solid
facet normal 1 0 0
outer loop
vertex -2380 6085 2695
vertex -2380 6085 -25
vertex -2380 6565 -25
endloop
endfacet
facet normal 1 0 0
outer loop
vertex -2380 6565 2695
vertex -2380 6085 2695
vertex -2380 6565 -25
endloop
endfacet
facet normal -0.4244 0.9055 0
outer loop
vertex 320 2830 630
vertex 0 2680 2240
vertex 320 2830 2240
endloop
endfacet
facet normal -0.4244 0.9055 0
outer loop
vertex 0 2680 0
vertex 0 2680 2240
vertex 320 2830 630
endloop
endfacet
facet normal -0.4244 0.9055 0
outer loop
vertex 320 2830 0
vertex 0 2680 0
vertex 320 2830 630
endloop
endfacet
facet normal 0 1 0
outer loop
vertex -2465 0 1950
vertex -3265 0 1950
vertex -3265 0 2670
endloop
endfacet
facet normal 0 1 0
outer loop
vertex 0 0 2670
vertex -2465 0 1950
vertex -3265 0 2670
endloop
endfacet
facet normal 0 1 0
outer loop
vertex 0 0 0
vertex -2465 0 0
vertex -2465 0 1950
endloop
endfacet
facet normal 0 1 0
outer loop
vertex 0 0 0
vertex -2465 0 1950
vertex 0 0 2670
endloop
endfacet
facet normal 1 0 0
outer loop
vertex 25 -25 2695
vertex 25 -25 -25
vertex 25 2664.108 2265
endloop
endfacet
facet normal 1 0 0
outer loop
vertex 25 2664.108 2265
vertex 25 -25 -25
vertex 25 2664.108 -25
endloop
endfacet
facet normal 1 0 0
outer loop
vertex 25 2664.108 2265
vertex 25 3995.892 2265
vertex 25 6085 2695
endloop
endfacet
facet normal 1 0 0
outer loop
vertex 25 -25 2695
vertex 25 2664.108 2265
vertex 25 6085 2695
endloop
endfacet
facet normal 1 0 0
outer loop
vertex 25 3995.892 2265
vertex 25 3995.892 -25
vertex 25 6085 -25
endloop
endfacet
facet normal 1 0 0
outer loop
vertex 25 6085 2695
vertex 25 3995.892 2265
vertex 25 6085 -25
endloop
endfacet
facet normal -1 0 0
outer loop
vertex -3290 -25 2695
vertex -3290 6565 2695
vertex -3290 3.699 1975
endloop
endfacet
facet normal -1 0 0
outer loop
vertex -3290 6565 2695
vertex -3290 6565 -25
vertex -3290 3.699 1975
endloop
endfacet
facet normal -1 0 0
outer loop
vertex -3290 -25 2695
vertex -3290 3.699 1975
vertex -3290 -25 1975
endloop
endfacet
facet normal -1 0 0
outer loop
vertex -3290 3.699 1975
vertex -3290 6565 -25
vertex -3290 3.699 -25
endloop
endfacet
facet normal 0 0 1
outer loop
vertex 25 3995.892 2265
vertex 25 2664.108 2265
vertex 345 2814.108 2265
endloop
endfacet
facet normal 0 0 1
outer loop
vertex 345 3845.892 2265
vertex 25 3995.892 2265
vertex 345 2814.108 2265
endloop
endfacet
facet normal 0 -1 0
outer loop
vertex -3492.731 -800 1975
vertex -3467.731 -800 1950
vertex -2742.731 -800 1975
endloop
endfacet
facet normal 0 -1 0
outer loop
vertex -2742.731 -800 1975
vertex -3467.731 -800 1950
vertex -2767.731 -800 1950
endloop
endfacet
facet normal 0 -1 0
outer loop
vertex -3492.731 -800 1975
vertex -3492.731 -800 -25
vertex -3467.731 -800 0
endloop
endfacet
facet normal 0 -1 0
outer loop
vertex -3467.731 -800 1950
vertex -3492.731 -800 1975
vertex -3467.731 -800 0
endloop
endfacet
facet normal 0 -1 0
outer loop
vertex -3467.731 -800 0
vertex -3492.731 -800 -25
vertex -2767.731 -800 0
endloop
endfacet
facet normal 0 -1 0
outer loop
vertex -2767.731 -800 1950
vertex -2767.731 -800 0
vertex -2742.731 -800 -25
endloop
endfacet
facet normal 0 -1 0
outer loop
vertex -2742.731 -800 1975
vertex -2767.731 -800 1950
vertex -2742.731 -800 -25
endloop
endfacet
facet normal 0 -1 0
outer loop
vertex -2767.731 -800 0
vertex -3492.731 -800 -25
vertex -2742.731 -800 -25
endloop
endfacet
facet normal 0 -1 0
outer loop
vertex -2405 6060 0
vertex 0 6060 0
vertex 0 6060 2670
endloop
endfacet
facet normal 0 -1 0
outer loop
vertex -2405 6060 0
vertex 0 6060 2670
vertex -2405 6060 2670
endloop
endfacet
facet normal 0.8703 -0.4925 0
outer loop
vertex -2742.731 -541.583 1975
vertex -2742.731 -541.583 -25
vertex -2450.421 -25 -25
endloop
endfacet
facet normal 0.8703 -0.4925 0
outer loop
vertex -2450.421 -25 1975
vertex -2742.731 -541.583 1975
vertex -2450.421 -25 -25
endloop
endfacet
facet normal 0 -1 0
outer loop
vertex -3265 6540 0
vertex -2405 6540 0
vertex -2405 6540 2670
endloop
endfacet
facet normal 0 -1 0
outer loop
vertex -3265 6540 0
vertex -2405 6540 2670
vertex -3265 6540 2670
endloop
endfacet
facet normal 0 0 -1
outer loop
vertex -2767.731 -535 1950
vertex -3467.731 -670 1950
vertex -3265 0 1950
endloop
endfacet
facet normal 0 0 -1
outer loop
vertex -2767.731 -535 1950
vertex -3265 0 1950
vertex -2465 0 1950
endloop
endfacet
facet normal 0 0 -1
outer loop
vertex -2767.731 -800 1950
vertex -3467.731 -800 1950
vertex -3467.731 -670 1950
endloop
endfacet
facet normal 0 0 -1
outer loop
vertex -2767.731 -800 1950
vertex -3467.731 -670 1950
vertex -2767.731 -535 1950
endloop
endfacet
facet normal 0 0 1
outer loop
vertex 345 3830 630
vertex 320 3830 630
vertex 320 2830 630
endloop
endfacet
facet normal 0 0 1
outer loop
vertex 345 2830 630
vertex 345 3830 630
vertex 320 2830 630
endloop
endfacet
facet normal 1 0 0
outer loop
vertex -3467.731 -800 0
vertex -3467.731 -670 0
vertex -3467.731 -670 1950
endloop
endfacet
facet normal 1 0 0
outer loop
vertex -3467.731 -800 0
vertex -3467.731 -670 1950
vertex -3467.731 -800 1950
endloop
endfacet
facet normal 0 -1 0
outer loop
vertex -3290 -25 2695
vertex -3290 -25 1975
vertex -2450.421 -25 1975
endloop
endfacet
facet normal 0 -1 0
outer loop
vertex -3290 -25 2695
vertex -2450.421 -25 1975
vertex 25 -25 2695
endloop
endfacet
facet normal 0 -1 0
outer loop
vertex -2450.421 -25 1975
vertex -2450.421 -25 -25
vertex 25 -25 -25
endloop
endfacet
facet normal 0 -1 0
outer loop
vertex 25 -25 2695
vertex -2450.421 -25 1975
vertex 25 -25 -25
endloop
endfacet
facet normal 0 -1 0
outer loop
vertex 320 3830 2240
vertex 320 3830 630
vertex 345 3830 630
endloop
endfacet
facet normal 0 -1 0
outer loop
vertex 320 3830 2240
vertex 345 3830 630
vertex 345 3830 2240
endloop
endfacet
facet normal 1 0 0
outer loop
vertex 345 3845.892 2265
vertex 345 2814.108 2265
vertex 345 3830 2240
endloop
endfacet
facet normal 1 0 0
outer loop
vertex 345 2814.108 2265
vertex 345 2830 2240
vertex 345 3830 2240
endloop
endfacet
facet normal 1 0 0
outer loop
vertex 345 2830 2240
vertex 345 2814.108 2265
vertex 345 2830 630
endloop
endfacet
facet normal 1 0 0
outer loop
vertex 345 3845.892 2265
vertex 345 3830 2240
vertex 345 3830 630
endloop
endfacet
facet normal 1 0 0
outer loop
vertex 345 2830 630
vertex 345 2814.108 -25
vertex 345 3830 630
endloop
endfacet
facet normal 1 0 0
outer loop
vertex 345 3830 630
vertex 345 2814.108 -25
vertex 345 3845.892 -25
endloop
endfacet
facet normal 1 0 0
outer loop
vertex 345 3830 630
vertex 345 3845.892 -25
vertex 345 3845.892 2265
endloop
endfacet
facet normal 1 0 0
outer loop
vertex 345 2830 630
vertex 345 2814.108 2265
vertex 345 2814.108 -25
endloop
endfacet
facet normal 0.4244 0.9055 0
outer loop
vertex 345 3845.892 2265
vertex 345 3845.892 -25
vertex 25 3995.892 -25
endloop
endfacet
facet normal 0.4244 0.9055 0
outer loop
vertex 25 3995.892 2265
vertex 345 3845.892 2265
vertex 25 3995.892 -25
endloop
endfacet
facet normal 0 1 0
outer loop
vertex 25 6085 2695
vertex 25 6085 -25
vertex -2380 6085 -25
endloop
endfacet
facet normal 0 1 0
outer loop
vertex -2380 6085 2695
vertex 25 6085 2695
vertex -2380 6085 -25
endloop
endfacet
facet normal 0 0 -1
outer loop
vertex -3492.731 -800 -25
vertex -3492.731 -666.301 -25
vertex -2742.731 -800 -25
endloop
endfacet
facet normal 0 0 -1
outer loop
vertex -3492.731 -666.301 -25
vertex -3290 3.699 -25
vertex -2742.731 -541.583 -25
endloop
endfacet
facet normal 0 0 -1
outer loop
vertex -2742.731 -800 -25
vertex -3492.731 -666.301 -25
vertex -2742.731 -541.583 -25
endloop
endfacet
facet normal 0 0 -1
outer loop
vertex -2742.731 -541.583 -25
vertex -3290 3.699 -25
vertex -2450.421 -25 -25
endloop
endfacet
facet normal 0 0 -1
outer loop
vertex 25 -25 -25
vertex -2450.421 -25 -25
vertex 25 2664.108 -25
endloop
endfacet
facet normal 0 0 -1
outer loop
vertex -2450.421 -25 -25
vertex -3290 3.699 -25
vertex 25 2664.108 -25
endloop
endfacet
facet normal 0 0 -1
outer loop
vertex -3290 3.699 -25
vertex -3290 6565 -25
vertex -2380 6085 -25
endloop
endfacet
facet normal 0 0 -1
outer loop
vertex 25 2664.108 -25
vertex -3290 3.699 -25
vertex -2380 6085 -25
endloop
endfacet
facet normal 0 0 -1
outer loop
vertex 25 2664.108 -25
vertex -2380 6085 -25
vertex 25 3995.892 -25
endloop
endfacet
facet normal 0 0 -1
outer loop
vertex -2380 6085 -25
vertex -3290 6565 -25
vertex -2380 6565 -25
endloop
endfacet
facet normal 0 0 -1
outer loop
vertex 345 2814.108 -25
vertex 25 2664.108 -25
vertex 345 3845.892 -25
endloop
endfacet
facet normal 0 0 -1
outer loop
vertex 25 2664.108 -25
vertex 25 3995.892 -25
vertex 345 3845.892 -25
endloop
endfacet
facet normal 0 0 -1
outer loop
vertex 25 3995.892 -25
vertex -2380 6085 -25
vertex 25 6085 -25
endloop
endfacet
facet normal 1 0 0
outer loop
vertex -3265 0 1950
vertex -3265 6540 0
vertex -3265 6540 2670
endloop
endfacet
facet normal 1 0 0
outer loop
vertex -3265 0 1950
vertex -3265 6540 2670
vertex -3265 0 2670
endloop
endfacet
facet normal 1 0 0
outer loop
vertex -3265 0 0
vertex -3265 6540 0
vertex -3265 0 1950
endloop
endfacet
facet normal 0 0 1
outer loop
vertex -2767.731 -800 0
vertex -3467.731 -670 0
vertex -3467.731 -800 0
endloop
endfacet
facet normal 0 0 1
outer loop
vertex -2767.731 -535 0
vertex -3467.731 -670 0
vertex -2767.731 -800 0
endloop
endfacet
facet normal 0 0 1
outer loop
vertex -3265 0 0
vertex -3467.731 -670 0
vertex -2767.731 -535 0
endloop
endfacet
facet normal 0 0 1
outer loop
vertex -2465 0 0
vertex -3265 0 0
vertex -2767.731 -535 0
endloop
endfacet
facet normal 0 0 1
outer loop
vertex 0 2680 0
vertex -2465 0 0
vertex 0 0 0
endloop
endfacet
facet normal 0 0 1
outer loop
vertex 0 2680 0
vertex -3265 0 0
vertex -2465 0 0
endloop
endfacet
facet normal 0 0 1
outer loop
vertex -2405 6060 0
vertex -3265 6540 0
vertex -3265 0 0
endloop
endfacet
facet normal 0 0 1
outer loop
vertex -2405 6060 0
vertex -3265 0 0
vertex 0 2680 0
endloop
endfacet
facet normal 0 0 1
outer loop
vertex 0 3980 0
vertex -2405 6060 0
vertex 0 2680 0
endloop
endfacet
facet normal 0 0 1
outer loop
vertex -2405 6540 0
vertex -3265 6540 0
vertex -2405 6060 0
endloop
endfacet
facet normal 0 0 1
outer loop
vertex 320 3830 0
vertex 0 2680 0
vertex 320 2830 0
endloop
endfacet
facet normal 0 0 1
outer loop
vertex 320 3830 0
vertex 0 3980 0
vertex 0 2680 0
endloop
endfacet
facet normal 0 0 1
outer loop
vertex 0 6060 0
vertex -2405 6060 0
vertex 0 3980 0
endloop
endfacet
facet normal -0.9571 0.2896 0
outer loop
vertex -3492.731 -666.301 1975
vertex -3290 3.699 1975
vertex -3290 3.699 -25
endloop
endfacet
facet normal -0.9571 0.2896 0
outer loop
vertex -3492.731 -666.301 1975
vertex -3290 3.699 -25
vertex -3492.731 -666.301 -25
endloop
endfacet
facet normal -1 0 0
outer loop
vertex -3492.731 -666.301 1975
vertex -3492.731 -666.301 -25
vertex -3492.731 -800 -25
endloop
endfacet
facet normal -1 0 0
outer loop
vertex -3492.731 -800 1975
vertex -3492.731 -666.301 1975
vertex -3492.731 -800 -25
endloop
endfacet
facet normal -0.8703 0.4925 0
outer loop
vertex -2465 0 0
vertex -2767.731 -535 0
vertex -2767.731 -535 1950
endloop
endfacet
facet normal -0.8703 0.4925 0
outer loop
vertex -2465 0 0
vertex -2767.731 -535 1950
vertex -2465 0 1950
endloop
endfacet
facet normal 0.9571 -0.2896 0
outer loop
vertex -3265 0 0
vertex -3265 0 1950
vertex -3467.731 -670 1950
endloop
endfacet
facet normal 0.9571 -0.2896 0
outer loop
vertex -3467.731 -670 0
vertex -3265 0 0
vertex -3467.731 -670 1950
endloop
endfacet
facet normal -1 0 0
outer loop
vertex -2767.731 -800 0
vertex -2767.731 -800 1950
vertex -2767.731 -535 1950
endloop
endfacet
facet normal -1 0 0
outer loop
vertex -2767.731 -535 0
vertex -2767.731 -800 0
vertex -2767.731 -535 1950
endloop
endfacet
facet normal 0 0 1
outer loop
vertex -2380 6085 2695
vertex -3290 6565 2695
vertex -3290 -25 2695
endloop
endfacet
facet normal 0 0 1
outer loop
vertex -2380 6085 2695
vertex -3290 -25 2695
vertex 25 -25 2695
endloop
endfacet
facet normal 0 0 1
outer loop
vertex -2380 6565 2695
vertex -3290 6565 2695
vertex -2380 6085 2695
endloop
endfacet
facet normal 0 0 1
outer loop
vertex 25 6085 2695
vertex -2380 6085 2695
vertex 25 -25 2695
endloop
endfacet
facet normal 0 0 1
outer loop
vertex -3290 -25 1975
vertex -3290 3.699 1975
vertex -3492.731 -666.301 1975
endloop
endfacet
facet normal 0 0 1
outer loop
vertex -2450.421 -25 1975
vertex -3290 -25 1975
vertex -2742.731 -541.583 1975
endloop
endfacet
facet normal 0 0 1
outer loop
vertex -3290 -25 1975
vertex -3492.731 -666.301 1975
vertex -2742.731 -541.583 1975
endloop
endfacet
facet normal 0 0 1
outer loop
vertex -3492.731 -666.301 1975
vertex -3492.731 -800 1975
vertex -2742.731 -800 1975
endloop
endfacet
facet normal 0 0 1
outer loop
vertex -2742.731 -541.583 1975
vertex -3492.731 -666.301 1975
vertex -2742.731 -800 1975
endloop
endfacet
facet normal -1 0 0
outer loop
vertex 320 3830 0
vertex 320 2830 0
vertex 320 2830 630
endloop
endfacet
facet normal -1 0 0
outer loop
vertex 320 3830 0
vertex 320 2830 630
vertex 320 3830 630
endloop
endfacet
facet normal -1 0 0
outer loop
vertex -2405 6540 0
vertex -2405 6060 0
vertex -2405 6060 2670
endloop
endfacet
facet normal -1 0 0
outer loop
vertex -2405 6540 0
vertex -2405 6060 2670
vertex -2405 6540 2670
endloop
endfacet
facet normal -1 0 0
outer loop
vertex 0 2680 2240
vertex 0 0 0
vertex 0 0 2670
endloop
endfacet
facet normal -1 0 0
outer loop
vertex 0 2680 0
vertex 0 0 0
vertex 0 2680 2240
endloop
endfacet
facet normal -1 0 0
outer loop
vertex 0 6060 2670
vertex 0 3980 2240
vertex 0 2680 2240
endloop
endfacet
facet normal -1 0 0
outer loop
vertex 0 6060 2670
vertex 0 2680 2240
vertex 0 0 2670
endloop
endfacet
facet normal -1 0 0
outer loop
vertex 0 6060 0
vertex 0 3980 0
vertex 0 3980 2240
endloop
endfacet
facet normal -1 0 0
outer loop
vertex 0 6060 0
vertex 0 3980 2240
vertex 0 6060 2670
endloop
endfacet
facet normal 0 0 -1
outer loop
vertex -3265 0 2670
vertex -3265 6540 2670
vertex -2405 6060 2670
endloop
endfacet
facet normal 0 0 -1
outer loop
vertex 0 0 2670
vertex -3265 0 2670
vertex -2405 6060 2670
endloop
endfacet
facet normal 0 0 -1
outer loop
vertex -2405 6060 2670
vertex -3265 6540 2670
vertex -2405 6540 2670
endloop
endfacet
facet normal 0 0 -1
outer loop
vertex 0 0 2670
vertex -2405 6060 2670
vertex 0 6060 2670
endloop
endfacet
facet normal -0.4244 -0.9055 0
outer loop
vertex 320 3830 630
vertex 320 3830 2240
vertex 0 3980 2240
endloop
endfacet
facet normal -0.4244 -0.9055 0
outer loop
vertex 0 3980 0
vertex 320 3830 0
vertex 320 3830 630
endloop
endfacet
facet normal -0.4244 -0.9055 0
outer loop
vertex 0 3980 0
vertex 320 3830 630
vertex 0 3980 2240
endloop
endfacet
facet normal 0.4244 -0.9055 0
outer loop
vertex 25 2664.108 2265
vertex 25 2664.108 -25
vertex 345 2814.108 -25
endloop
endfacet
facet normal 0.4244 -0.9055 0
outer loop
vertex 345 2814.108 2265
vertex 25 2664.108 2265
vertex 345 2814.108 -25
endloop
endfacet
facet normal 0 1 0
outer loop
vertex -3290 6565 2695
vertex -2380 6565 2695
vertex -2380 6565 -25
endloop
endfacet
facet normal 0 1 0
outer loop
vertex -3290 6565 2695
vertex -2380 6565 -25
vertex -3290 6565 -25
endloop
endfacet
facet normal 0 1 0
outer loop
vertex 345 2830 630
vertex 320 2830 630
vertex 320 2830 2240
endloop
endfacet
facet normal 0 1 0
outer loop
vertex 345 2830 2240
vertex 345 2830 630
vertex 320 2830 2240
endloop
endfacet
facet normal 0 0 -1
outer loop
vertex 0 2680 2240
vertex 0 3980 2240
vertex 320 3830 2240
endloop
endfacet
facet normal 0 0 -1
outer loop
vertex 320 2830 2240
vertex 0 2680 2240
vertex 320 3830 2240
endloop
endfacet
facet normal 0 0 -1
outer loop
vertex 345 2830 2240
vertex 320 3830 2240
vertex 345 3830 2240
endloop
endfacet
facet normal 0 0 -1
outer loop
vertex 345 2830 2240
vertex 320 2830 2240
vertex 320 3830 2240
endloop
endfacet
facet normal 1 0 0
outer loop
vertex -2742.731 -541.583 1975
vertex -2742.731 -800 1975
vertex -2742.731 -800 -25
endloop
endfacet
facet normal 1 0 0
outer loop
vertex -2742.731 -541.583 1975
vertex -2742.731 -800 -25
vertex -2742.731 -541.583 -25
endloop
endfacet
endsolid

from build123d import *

# Parameters (mm, degrees)
F1_DEPTH  = 2670
F4_DEPTH  = 720
F7_DEPTH  = 430
F8_T      = 25
F9_W      = 1000
F9_H      = 1610
F10_DEPTH = 25


with BuildPart() as f1:
    # F0 (on Top) → F1 (new body)
    with BuildSketch(Plane.XY):
        Polygon((-2465, 0), (0, 0), (0, 2680), (320, 2830), (320, 3830), (0, 3980), (0, 6060), (-2405, 6060), (-2405, 6540), (-3265, 6540), (-3265, 0), (-3467.7313493271, -670), (-3467.7313493271, -800), (-2767.7313493271, -800), (-2767.7313493271, -535), align=None)
    extrude(amount=F1_DEPTH)

    # F3 (on offset) → F4 (cut, through all)
    with BuildSketch(Plane(origin=(0, 0, 1950), x_dir=(1, 0, 0), z_dir=(0, 0, -1))):
        Polygon((-3467.7313493271, 670), (-3265, 0), (-2465, 0), (-2767.7313493271, 535), (-2767.7313493271, 800), (-3467.7313493271, 800), align=None)
    extrude(amount=-F4_DEPTH, mode=Mode.SUBTRACT)

    # F6 (on offset) → F7 (cut, through all)
    with BuildSketch(Plane(origin=(0, 0, 2240), x_dir=(1, 0, 0), z_dir=(0, 0, -1))):
        Polygon((320, -3830), (320, -2830), (0, -2680), (0, -3980), align=None)
    extrude(amount=-F7_DEPTH, mode=Mode.SUBTRACT)

    # F8
    f8_openings = [f1.faces().sort_by_distance(p)[0] for p in [
        (-3117.731349, -800, 975),
    ]]
    offset(amount=F8_T, openings=f8_openings, kind=Kind.INTERSECTION)

    # F9 (on face) → F10 (cut, through all)
    with BuildSketch(Plane(origin=(320, 0, 0), x_dir=(0, -1, 0), z_dir=(-1, 0, 0))):
        with Locations((-3330, 1435)):
            Rectangle(F9_W, F9_H)
    extrude(amount=-F10_DEPTH, mode=Mode.SUBTRACT)


solid = f1.part
